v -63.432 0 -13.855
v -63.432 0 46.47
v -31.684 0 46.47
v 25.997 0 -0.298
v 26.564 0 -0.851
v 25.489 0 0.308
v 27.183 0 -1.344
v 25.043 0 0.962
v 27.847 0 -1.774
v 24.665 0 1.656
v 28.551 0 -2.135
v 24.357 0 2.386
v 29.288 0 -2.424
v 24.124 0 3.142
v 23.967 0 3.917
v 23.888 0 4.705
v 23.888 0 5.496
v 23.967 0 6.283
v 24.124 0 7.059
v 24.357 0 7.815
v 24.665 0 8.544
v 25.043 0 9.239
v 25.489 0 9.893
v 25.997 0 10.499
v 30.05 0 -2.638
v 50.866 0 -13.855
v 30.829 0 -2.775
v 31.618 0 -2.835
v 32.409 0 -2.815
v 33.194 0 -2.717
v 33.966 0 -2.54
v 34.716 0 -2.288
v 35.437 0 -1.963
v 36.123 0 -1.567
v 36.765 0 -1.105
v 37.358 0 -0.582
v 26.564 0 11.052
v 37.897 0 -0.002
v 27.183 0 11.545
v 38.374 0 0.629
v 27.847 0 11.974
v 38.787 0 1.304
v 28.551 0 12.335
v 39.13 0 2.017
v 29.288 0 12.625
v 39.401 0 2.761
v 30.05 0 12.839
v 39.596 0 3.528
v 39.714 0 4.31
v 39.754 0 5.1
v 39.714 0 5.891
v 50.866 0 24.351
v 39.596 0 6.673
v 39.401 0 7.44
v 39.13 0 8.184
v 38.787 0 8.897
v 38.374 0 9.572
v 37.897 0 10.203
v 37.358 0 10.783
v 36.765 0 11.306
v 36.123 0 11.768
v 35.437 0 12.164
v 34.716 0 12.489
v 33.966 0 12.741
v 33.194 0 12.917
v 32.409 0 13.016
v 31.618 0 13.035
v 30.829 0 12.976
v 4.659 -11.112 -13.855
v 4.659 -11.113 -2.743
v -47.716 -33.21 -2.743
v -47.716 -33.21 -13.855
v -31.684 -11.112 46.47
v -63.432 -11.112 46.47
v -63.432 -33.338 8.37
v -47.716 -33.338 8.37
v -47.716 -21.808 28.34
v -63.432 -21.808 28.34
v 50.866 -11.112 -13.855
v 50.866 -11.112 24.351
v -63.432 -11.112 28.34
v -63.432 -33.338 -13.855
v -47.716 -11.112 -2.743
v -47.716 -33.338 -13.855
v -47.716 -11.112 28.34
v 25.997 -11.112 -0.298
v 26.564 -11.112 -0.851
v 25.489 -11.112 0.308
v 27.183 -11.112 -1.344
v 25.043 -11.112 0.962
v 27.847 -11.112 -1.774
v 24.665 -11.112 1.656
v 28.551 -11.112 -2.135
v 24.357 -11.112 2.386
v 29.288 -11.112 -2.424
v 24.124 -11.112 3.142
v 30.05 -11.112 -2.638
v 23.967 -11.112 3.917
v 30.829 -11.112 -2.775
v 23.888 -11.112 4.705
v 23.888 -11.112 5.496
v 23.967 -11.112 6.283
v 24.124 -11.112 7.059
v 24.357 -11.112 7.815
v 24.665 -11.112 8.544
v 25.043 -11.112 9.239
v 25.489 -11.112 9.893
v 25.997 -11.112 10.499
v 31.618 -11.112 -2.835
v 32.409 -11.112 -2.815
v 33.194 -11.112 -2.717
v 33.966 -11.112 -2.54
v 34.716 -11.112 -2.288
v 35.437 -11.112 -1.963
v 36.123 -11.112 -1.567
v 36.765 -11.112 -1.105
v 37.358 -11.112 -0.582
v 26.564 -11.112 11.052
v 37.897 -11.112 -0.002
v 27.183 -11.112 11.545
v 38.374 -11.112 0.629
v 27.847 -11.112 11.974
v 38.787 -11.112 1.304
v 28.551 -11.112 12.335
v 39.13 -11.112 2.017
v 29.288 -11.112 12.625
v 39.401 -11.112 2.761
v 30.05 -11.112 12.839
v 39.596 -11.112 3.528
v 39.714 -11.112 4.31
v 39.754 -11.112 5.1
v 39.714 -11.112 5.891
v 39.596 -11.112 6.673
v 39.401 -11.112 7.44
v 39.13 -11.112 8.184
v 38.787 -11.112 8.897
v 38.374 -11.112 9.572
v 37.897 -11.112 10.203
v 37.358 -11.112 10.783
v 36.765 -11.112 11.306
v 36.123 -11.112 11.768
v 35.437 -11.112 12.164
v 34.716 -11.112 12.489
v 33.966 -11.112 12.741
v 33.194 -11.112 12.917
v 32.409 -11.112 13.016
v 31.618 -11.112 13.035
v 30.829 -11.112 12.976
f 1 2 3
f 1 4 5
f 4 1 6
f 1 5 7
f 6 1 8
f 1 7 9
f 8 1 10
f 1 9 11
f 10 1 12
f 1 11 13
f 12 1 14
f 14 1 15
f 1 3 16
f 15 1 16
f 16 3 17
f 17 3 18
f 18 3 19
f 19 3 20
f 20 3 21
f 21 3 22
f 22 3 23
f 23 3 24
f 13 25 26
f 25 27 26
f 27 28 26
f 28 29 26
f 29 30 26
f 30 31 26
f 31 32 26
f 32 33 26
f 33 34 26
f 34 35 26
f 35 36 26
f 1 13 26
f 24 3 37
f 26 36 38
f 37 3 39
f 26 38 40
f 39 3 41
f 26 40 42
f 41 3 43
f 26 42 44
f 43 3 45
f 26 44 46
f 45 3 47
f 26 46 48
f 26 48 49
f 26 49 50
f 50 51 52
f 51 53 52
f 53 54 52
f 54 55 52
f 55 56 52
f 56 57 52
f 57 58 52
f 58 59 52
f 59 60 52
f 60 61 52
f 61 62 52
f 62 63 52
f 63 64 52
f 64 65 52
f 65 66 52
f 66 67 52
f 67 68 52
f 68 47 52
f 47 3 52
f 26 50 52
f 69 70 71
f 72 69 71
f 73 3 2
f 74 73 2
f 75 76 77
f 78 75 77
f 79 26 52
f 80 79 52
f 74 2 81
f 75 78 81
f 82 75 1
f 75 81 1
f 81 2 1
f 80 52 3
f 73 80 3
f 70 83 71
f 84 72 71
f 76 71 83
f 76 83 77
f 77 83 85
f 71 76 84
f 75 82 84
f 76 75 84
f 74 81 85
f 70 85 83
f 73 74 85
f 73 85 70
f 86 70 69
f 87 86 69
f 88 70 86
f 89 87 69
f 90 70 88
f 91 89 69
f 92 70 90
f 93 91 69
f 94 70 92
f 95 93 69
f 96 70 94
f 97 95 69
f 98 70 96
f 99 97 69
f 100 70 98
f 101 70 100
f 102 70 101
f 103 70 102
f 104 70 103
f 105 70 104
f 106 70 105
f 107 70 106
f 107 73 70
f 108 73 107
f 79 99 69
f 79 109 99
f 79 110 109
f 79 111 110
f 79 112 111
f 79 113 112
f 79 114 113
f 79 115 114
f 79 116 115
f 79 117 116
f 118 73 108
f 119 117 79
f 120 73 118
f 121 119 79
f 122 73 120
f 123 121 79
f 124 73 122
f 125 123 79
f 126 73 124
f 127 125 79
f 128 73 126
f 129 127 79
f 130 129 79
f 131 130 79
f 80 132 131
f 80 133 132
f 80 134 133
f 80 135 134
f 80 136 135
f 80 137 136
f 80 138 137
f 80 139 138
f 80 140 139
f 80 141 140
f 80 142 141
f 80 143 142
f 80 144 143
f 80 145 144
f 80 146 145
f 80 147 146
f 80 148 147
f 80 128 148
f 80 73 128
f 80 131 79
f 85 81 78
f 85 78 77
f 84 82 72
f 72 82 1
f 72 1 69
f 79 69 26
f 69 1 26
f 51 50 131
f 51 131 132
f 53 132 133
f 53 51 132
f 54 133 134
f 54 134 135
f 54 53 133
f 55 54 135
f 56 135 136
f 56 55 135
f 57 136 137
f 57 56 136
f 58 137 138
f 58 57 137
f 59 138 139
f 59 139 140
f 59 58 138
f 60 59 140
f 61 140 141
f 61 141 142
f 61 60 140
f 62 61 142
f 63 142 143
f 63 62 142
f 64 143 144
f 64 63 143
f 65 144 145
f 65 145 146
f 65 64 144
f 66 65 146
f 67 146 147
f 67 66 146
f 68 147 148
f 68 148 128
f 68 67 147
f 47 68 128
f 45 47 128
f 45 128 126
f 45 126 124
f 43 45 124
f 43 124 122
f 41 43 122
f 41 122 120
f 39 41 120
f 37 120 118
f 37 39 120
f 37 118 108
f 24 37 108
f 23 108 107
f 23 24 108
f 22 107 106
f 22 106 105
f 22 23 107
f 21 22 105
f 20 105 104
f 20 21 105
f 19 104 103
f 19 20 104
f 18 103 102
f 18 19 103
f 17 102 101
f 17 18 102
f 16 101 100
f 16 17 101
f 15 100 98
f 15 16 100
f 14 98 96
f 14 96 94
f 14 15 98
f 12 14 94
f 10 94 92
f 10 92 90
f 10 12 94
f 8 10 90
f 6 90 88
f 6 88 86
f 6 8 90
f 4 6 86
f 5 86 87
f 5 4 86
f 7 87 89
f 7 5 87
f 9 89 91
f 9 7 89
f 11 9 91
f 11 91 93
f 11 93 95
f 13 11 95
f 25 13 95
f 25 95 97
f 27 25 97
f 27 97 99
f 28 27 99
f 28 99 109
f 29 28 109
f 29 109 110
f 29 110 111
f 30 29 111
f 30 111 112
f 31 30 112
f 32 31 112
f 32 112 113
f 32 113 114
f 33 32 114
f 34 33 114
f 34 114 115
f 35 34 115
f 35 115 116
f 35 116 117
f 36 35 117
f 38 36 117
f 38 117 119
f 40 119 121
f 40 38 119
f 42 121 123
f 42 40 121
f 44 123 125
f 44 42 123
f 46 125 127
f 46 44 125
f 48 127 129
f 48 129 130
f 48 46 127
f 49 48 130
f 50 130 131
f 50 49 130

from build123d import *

# Parameters (mm, degrees)
F0_R     = 7.9375
F0_W     = 15.7160045163
F0_H     = 42.1948071688
F1_DEPTH = 11.1125
F2_DEPTH = 33.3375
F4_DEPTH = 25.4
F5_W     = 52.3748
F5_H     = 11.1125
F6_DEPTH = 22.098
F8_DEPTH = 25.4


with BuildPart() as f1:
    # F0 (on Front) → F1 (new body)
    with BuildSketch(Plane.XZ):
        Polygon((-31.6839508394, 46.4698135108), (-63.4320186035, 46.4698135108), (-63.4320186035, 28.3396206796), (-47.7160140872, 28.3396206796), (-47.7160140872, -13.8551864892), (50.8660491606, -13.8551864892), (50.8660491606, 24.3506076756), align=None)
        with Locations((31.8160491606, 5.1003992379)):
            Circle(F0_R, mode=Mode.SUBTRACT)
        with Locations((-55.5740163454, 7.2422170952)):
            Rectangle(F0_W, F0_H)
    extrude(amount=F1_DEPTH)

    # F0 (on Front) → F2 (join)
    with BuildSketch(Plane.XZ):
        with Locations((-55.5740163454, 7.2422170952)):
            Rectangle(F0_W, F0_H)
    extrude(amount=F2_DEPTH)

    # F3 (on face) → F4 (cut)
    with BuildSketch(Plane.YZ.offset(-47.7160140872)):
        Polygon((-33.3375, 28.3396206796), (-33.3375, 8.3698135108), (-21.8079264554, 28.3396206796), align=None)
    extrude(amount=-F4_DEPTH, mode=Mode.SUBTRACT)

    # F5 (on face) → F6 (join)
    with BuildSketch(Plane.XZ.offset(11.1125)):
        with Locations((-21.5286140872, -8.2989364892)):
            Rectangle(F5_W, F5_H)
    extrude(amount=F6_DEPTH)

    # F7 (on face) → F8 (cut)
    with BuildSketch(Plane.XY.offset(-2.7426864892)):
        Polygon((4.6587859128, -11.1125), (-47.7160140872, -33.2105), (4.6587859128, -33.2105), align=None)
    extrude(amount=-F8_DEPTH, mode=Mode.SUBTRACT)


solid = f1.part
